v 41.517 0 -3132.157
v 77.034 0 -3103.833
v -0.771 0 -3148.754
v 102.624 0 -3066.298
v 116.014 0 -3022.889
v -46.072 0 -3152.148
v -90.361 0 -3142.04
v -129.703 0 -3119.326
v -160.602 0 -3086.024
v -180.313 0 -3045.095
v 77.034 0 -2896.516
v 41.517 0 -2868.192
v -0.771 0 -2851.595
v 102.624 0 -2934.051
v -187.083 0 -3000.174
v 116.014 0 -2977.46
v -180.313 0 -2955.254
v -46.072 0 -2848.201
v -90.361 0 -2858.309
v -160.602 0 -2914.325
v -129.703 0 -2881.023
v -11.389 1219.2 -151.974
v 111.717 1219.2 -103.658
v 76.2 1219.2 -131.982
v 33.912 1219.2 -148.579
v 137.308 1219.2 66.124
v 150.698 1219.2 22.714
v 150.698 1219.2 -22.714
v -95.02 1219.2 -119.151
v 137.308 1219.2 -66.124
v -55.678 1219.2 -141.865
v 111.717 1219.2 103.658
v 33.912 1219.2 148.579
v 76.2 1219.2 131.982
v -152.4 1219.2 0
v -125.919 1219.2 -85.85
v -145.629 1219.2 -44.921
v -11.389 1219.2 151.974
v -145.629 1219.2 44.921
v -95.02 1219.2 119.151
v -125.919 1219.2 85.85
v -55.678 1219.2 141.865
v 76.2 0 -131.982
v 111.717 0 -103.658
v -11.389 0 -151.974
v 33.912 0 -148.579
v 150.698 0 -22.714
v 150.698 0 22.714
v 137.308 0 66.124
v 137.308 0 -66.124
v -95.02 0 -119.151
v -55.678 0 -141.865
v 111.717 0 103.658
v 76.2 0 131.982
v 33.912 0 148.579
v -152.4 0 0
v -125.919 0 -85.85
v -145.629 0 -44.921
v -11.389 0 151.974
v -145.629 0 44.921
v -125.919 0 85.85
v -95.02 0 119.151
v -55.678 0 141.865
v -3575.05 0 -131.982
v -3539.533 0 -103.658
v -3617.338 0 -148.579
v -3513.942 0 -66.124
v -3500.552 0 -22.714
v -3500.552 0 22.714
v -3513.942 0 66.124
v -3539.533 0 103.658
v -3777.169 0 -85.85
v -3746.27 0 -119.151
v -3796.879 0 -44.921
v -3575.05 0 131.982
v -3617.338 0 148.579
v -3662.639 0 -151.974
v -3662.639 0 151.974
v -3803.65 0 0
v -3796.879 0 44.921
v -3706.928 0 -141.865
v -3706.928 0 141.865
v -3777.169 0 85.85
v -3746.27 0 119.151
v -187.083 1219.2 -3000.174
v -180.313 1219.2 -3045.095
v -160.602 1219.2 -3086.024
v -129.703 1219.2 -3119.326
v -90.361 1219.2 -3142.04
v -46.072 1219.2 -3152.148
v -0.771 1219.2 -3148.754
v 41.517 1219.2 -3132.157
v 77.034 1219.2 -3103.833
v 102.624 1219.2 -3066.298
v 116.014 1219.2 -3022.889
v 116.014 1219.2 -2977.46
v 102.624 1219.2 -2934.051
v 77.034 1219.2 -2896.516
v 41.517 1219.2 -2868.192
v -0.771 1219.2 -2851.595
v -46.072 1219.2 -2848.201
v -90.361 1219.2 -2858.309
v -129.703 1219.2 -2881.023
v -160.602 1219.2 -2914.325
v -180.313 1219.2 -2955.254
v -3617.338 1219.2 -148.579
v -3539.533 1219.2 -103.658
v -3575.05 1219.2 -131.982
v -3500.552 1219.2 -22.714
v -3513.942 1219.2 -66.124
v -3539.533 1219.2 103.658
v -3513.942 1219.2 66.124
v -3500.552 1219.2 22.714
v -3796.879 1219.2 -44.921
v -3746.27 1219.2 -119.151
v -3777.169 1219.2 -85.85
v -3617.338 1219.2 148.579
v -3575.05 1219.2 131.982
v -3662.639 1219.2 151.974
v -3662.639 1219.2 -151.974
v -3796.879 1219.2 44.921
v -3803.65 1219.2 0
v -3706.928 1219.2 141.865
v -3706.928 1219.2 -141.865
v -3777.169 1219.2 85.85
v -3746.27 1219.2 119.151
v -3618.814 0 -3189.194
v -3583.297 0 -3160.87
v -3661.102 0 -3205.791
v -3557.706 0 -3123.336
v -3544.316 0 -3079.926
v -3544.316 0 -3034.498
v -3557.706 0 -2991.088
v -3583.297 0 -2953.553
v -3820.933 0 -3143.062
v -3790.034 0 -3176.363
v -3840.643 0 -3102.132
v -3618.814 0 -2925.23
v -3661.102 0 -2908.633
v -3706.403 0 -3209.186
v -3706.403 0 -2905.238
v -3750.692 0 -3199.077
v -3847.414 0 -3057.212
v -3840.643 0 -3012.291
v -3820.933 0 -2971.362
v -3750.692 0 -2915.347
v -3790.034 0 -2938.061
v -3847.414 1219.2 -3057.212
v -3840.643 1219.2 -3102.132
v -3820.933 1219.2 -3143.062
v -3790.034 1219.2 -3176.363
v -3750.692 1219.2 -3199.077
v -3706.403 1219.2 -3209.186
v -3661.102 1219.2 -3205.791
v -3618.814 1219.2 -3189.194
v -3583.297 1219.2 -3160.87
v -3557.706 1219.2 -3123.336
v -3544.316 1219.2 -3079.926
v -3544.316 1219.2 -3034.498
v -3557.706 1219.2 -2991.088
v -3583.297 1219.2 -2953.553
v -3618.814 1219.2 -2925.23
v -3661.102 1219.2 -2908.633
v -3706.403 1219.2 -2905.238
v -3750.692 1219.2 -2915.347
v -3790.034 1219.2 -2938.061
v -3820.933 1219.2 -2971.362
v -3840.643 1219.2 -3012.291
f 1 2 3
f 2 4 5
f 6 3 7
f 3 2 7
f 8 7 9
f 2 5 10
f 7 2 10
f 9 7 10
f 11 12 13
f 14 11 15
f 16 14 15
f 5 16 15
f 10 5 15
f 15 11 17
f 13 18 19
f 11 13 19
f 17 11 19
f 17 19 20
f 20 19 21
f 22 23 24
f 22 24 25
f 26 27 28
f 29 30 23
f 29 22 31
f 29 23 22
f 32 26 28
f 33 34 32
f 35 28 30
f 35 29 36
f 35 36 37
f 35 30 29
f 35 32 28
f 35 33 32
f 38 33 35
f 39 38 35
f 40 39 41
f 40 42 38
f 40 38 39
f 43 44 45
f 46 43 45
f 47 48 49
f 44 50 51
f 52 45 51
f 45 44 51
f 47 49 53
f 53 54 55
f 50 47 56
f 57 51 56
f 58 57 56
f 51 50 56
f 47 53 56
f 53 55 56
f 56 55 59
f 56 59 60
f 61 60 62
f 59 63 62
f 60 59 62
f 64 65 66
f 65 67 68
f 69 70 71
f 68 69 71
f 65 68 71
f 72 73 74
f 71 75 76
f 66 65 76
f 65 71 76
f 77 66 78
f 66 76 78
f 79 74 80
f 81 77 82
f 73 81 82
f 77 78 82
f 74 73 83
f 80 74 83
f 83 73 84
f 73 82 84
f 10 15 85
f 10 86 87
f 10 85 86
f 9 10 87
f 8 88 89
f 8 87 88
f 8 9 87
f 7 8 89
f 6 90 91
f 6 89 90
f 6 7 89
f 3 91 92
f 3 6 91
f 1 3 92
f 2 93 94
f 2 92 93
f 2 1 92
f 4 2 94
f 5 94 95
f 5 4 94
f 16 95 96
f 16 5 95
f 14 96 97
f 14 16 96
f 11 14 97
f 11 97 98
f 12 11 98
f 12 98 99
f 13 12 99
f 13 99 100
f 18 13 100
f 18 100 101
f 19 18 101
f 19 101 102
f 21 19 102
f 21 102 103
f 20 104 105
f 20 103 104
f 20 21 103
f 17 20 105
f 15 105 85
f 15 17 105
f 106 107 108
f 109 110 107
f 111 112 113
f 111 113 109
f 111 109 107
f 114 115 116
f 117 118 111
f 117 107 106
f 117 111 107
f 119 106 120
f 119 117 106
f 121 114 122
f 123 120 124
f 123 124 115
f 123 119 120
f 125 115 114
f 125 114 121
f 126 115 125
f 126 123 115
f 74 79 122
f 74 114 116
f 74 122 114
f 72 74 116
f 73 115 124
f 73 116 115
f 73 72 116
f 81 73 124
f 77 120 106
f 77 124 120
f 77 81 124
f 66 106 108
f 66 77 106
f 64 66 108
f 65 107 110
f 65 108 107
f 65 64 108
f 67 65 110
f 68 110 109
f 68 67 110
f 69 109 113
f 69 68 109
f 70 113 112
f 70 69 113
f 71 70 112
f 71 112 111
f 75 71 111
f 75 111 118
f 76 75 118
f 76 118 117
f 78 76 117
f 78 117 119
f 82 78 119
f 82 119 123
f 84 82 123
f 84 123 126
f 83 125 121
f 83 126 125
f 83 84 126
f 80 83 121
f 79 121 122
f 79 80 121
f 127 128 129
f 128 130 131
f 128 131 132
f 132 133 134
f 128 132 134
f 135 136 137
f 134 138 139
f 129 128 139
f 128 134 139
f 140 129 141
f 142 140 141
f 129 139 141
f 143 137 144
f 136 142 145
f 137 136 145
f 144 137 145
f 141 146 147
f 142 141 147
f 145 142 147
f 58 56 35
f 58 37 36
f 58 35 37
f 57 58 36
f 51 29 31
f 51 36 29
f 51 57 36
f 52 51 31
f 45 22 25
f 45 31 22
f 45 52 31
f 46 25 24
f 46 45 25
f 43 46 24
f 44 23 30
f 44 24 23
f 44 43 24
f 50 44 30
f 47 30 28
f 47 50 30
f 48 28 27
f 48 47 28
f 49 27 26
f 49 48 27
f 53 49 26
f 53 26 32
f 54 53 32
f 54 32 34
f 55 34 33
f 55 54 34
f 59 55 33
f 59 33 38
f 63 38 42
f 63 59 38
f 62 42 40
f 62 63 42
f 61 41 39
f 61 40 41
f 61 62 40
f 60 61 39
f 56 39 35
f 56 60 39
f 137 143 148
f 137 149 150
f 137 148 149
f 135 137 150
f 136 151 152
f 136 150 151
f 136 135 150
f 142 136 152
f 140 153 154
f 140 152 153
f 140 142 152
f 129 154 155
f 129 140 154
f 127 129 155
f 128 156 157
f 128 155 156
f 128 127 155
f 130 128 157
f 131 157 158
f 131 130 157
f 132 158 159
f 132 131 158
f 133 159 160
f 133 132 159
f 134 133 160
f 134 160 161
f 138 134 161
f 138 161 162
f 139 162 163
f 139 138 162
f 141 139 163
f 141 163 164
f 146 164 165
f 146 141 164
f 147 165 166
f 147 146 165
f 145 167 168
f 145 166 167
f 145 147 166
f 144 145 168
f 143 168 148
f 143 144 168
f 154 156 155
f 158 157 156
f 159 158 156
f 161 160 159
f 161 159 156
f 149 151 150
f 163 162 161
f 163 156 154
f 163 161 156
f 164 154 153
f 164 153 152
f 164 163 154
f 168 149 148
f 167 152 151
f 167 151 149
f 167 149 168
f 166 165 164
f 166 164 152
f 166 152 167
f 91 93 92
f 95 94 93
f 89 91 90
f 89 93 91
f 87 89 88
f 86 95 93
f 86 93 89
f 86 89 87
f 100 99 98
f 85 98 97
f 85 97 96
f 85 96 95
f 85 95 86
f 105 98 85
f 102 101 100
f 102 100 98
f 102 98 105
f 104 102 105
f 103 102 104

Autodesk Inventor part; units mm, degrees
ref_plane "YZ Plane" through (0, 0, 0) normal (1, 0, 0) x (0, 1, 0)
ref_plane "XZ Plane" through (0, 0, 0) normal (0, 1, 0) x (-1, 0, 0)
ref_plane "XY Plane" through (0, 0, 0) normal (0, 0, 1) x (1, 0, 0)
sketch "Sketch1" plane through (0, 0, 0) normal (0, 1, 0) x (-1, 0, 0)
  circle A0 centre (0, 0) radius 152.4
  circle A1 centre (34.6834, -3000.1745) radius 152.4
  circle A2 centre (3695.0141, -3057.2118) radius 152.4
  circle A3 centre (3651.25, 0) radius 152.4
  dimension "d0" = 304.8
  dimension "d3" = 3651.25
  dimension "d4" = 3000.375
  dimension "d5" = 3057.525
  dimension "d6" = 3660.775
  dimension "d8" = 4699
extrude "Extrusion2" add sketch "Sketch1" along normal blind 1219.2
properties part number "pylon" material "Concrete"
